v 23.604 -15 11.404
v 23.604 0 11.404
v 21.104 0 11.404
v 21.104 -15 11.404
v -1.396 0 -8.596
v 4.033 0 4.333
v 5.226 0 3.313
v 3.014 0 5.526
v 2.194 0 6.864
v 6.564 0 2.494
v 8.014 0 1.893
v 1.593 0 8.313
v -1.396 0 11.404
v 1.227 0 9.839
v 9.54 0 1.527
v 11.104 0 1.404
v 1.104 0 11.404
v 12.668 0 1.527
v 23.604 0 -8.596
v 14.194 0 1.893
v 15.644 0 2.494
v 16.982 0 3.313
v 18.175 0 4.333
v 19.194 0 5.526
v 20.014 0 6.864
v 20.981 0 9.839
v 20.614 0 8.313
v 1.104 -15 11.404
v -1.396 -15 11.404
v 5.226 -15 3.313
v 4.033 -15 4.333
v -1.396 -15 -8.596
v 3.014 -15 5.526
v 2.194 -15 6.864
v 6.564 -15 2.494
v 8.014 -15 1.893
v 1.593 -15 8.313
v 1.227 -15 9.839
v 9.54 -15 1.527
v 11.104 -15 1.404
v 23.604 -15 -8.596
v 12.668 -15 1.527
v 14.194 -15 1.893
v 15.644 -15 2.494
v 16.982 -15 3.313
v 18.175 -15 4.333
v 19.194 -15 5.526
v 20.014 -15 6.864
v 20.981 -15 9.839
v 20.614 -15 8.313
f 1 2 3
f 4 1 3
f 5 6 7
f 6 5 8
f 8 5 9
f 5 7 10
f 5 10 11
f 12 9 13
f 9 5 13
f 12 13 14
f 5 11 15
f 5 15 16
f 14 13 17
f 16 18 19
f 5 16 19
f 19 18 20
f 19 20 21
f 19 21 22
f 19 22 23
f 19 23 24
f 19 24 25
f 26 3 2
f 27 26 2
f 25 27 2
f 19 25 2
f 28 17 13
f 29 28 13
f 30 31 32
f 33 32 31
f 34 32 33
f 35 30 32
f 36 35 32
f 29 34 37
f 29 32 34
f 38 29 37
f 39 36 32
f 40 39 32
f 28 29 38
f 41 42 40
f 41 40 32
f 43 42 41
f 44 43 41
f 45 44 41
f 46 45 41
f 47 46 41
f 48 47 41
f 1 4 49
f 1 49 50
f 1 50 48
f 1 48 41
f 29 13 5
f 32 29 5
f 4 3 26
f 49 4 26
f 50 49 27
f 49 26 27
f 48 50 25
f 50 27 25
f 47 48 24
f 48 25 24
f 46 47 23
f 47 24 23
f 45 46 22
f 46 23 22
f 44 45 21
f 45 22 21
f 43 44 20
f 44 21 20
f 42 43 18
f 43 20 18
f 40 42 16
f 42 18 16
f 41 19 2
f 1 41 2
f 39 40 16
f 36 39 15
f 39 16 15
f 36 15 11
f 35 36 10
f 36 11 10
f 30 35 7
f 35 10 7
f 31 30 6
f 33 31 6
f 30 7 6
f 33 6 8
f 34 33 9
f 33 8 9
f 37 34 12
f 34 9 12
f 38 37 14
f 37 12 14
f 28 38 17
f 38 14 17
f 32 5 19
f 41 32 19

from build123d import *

# Parameters (mm, degrees)
F1_DEPTH = 15


with BuildPart() as f1:
    # F0 (on Front) → F1 (new body)
    with BuildSketch(Plane.XZ):
        with BuildLine():
            Line((23.603925, 11.403642), (21.103925, 11.403642))
            ThreePointArc((21.103925, 11.403642), (18.174993, 4.332574), (11.103925, 1.403642))
            ThreePointArc((11.103925, 1.403642), (4.032858, 4.332574), (1.103925, 11.403642))
            Line((1.103925, 11.403642), (-1.396075, 11.403642))
            Line((-1.396075, 11.403642), (-1.396075, -8.596358))
            Line((-1.396075, -8.596358), (23.603925, -8.596358))
            Line((23.603925, -8.596358), (23.603925, 11.403642))
        make_face()
    extrude(amount=F1_DEPTH)


solid = f1.part
